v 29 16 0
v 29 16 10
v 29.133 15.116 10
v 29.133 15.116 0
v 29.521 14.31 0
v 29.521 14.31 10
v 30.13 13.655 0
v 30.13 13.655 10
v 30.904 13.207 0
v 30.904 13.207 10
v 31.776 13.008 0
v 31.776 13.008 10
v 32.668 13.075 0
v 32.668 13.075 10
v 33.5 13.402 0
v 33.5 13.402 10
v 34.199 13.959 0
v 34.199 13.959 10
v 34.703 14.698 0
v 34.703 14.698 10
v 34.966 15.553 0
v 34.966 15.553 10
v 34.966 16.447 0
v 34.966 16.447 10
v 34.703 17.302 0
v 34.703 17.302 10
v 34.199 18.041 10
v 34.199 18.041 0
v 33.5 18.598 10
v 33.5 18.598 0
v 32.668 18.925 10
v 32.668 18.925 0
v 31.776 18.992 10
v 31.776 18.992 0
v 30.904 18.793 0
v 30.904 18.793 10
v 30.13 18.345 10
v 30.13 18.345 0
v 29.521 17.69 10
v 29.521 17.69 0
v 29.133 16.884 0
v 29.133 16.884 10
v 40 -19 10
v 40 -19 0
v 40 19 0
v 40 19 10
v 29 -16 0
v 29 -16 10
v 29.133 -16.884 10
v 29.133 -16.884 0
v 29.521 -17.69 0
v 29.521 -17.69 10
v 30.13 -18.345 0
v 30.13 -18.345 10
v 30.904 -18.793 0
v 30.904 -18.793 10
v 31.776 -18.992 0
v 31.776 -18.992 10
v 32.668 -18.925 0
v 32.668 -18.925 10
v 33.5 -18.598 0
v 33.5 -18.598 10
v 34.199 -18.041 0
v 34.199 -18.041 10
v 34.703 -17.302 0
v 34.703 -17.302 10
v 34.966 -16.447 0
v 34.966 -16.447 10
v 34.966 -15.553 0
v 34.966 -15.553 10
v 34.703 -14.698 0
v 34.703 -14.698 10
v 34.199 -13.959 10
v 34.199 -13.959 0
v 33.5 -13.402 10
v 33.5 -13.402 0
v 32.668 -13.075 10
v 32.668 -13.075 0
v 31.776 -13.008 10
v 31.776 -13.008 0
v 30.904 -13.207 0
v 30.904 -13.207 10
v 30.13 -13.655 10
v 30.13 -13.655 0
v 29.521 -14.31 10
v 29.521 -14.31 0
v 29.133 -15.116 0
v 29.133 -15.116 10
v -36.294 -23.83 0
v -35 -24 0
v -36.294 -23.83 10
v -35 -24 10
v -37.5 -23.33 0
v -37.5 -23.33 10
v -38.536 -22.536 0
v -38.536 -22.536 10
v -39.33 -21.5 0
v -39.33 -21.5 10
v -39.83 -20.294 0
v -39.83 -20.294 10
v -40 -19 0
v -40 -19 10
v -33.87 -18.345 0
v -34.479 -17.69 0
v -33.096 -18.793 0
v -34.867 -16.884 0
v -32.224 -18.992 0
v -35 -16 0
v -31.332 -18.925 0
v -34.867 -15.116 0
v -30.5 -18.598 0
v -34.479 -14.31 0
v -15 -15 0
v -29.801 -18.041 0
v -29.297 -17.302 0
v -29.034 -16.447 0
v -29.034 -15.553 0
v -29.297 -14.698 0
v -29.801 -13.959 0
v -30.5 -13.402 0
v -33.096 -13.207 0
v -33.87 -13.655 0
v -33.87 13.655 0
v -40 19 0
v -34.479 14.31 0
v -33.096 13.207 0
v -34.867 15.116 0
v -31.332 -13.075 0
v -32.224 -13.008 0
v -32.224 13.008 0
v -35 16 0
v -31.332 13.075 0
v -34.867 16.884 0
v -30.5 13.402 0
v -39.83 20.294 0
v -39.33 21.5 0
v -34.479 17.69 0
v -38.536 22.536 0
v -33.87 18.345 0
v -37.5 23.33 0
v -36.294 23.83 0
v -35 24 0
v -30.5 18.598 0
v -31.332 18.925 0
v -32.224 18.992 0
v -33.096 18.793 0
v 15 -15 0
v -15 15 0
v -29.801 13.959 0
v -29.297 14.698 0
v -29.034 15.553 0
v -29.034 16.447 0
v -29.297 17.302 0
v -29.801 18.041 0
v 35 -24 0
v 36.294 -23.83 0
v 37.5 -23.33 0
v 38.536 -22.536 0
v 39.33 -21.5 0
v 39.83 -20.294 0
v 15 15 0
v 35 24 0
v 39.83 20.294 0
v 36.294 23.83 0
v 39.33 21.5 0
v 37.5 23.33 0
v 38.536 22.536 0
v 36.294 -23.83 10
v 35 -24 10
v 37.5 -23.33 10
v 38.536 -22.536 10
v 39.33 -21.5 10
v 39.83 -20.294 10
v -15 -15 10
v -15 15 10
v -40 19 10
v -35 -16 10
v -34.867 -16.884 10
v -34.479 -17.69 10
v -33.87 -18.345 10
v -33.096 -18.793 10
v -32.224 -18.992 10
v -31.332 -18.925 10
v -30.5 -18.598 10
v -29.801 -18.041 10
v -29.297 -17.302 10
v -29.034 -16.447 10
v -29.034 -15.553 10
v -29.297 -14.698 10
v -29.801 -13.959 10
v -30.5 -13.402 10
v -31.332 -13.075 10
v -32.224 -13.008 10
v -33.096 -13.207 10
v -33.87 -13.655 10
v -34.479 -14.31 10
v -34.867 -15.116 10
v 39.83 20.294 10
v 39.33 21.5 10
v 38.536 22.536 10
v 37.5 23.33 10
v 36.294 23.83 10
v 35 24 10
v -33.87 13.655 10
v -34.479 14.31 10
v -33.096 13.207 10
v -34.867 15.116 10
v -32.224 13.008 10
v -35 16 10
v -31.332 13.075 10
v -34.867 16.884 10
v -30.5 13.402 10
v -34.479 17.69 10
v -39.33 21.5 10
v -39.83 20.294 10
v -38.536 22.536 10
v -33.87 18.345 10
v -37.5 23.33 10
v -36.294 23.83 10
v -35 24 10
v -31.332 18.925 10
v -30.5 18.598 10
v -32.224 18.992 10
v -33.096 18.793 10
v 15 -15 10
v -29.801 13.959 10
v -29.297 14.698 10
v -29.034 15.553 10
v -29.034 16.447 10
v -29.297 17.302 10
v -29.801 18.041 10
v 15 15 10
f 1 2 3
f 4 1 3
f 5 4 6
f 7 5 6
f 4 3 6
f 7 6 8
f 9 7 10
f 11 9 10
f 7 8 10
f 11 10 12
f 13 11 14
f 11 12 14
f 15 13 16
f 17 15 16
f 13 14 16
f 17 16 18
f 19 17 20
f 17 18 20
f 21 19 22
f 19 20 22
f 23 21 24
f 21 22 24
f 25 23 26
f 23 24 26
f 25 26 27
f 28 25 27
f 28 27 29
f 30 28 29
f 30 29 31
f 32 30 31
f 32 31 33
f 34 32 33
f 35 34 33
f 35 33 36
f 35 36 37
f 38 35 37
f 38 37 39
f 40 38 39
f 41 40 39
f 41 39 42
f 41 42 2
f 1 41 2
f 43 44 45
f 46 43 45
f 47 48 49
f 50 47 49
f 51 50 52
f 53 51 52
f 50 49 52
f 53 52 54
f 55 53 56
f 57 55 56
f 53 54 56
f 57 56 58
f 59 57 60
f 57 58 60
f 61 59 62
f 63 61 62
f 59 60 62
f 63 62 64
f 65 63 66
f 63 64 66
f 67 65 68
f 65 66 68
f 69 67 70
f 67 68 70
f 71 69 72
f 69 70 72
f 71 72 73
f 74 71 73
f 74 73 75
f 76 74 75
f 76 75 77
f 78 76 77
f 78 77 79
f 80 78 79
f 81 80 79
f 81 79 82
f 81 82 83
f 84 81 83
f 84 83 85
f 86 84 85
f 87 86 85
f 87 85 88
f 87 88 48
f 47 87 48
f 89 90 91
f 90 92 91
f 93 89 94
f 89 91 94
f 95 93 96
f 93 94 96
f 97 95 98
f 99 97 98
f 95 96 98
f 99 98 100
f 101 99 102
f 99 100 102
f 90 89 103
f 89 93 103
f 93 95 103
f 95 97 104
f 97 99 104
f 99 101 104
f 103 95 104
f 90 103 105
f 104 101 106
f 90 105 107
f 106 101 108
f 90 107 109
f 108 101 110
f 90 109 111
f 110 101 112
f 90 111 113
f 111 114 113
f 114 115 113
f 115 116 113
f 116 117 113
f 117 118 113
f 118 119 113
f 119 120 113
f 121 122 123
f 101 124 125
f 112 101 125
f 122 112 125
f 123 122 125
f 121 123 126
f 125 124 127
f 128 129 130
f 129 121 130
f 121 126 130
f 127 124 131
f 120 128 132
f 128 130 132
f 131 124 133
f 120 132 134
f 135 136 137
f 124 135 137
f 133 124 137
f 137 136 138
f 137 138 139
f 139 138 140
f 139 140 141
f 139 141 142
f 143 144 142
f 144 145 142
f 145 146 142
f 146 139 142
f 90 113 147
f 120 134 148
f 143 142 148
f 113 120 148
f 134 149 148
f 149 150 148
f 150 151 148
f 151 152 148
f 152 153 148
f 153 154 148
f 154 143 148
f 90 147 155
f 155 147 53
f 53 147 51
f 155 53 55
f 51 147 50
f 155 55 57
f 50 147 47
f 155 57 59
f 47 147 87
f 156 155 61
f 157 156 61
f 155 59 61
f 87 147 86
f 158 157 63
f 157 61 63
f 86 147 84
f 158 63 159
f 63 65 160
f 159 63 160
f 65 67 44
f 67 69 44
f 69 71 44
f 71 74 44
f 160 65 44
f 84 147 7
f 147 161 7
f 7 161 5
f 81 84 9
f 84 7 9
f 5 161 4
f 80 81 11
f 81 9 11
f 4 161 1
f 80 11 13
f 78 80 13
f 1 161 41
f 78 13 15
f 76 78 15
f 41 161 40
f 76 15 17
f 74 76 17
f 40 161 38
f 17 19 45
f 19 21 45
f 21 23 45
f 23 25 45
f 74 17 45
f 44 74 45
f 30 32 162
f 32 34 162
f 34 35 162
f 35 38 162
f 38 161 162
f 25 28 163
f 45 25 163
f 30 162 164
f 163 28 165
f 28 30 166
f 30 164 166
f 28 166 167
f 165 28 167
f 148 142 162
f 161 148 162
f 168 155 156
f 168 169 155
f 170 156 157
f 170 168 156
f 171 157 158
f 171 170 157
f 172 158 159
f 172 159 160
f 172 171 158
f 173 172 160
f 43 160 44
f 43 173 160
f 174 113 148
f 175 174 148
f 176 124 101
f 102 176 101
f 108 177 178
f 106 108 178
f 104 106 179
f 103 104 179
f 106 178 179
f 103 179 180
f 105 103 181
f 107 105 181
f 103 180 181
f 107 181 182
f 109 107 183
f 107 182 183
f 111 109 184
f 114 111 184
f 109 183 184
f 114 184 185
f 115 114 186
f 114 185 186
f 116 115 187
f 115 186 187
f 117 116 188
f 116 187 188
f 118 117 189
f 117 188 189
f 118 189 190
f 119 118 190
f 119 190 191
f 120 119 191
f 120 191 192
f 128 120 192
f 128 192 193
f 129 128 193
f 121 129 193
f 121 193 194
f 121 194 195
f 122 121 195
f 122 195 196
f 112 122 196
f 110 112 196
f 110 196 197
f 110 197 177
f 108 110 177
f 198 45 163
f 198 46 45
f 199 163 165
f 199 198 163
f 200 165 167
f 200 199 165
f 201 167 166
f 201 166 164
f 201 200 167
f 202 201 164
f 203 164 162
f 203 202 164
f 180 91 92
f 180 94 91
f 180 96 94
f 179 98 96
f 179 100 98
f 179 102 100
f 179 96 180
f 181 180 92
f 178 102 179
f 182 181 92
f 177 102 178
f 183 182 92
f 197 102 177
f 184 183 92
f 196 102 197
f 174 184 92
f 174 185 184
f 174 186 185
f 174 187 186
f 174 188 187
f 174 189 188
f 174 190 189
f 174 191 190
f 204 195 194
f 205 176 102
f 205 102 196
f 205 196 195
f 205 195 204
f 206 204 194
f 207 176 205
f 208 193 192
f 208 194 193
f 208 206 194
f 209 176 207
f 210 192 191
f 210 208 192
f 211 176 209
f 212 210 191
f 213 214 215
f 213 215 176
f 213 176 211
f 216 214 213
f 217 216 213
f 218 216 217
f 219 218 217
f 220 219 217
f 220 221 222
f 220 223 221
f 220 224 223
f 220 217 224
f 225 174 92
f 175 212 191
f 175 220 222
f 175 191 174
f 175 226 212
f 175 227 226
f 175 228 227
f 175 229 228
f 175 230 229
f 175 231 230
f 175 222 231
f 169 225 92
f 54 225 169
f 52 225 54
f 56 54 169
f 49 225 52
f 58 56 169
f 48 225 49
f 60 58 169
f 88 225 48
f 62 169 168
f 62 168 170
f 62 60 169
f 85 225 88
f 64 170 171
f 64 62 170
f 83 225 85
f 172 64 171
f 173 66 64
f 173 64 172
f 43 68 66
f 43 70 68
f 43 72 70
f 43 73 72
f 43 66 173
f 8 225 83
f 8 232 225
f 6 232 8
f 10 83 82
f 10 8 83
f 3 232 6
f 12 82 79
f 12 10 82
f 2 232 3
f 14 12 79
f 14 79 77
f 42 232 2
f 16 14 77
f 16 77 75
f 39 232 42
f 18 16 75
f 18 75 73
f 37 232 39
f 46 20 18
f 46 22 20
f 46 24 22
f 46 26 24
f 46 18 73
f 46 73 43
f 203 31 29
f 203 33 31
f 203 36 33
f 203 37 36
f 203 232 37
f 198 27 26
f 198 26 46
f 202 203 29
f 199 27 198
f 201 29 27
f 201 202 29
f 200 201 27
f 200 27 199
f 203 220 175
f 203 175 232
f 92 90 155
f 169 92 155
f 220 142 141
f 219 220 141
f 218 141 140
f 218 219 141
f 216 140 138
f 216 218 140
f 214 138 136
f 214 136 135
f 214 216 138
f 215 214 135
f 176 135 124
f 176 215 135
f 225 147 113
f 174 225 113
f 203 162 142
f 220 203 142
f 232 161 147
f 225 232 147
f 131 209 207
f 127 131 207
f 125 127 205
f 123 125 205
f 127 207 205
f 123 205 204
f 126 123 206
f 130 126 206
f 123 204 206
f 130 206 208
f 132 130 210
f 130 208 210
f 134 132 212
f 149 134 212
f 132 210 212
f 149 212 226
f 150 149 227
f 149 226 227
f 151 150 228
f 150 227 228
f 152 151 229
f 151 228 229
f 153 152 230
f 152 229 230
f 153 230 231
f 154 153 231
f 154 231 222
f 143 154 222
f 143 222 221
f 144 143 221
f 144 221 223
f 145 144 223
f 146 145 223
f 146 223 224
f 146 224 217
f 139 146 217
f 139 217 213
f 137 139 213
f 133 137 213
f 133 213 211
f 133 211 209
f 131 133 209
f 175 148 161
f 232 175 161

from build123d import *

# Parameters (mm, degrees)
F0_R     = 3
F1_DEPTH = 10
F2_R     = 5
F3_D     = 6


with BuildPart() as f1:
    # F0 (on Top) → F1 (new body)
    with BuildSketch(Plane.XY):
        with BuildLine():
            Line((-40, -24), (-12.3693168769, -24))
            ThreePointArc((-12.3693168769, -24), (-27, 0), (-12.3693168769, 24))
            Line((-12.3693168769, 24), (-40, 24))
            Line((-40, 24), (-40, -24))
        make_face()
        with BuildLine():
            Line((15, 0), (15, -15))
            Line((15, -15), (3.96875, -15))
            Line((3.96875, -15), (-3.96875, -15))
            Line((-3.96875, -15), (-15, -15))
            Line((-15, -15), (-15, 15))
            Line((-15, 15), (-3.96875, 15))
            Line((-3.96875, 15), (3.96875, 15))
            Line((3.96875, 15), (15, 15))
            Line((15, 15), (15, 4.21875))
            Line((15, 4.21875), (25.9915753842, 7.3101305768))
            ThreePointArc((25.9915753842, 7.3101305768), (20.9171568122, 17.0725672028), (12.3693168769, 24))
            Line((12.3693168769, 24), (-12.3693168769, 24))
            ThreePointArc((-12.3693168769, 24), (-27, 0), (-12.3693168769, -24))
            Line((-12.3693168769, -24), (12.3693168769, -24))
            ThreePointArc((12.3693168769, -24), (23.0539753153, -14.0539753153), (27, 0))
            Line((27, 0), (15, 0))
        make_face()
        with BuildLine():
            Line((15, 4.21875), (15, 0))
            Line((15, 0), (27, 0))
            ThreePointArc((27, 0), (26.7467057352, 3.6896791614), (25.9915753842, 7.3101305768))
            Line((25.9915753842, 7.3101305768), (15, 4.21875))
        make_face()
        with BuildLine():
            ThreePointArc((25.9915753842, 7.3101305768), (26.7467057352, 3.6896791614), (27, 0))
            ThreePointArc((27, 0), (23.0539753153, -14.0539753153), (12.3693168769, -24))
            Line((12.3693168769, -24), (40, -24))
            Line((40, -24), (40, 24))
            Line((40, 24), (12.3693168769, 24))
            ThreePointArc((12.3693168769, 24), (20.9171568122, 17.0725672028), (25.9915753842, 7.3101305768))
        make_face()
        with Locations((32, 16)):
            Circle(F0_R, mode=Mode.SUBTRACT)
        with Locations((32, 16)):
            Circle(F0_R)
    extrude(amount=F1_DEPTH)

    # F2
    f2_edges = [f1.edges().sort_by_distance(p)[0] for p in [
        (40, 24, 5),
        (40, -24, 5),
        (-40, 24, 5),
        (-40, -24, 5),
    ]]
    fillet(f2_edges, radius=F2_R)

    # F3 (through all)
    with Locations(Plane(origin=(0, 0, 0), x_dir=(1, 0, 0), z_dir=(0, 0, -1))):
        with Locations((32, -16), (32, 16), (-32, -16), (-32, 16)):
            Hole(F3_D / 2)


solid = f1.part
